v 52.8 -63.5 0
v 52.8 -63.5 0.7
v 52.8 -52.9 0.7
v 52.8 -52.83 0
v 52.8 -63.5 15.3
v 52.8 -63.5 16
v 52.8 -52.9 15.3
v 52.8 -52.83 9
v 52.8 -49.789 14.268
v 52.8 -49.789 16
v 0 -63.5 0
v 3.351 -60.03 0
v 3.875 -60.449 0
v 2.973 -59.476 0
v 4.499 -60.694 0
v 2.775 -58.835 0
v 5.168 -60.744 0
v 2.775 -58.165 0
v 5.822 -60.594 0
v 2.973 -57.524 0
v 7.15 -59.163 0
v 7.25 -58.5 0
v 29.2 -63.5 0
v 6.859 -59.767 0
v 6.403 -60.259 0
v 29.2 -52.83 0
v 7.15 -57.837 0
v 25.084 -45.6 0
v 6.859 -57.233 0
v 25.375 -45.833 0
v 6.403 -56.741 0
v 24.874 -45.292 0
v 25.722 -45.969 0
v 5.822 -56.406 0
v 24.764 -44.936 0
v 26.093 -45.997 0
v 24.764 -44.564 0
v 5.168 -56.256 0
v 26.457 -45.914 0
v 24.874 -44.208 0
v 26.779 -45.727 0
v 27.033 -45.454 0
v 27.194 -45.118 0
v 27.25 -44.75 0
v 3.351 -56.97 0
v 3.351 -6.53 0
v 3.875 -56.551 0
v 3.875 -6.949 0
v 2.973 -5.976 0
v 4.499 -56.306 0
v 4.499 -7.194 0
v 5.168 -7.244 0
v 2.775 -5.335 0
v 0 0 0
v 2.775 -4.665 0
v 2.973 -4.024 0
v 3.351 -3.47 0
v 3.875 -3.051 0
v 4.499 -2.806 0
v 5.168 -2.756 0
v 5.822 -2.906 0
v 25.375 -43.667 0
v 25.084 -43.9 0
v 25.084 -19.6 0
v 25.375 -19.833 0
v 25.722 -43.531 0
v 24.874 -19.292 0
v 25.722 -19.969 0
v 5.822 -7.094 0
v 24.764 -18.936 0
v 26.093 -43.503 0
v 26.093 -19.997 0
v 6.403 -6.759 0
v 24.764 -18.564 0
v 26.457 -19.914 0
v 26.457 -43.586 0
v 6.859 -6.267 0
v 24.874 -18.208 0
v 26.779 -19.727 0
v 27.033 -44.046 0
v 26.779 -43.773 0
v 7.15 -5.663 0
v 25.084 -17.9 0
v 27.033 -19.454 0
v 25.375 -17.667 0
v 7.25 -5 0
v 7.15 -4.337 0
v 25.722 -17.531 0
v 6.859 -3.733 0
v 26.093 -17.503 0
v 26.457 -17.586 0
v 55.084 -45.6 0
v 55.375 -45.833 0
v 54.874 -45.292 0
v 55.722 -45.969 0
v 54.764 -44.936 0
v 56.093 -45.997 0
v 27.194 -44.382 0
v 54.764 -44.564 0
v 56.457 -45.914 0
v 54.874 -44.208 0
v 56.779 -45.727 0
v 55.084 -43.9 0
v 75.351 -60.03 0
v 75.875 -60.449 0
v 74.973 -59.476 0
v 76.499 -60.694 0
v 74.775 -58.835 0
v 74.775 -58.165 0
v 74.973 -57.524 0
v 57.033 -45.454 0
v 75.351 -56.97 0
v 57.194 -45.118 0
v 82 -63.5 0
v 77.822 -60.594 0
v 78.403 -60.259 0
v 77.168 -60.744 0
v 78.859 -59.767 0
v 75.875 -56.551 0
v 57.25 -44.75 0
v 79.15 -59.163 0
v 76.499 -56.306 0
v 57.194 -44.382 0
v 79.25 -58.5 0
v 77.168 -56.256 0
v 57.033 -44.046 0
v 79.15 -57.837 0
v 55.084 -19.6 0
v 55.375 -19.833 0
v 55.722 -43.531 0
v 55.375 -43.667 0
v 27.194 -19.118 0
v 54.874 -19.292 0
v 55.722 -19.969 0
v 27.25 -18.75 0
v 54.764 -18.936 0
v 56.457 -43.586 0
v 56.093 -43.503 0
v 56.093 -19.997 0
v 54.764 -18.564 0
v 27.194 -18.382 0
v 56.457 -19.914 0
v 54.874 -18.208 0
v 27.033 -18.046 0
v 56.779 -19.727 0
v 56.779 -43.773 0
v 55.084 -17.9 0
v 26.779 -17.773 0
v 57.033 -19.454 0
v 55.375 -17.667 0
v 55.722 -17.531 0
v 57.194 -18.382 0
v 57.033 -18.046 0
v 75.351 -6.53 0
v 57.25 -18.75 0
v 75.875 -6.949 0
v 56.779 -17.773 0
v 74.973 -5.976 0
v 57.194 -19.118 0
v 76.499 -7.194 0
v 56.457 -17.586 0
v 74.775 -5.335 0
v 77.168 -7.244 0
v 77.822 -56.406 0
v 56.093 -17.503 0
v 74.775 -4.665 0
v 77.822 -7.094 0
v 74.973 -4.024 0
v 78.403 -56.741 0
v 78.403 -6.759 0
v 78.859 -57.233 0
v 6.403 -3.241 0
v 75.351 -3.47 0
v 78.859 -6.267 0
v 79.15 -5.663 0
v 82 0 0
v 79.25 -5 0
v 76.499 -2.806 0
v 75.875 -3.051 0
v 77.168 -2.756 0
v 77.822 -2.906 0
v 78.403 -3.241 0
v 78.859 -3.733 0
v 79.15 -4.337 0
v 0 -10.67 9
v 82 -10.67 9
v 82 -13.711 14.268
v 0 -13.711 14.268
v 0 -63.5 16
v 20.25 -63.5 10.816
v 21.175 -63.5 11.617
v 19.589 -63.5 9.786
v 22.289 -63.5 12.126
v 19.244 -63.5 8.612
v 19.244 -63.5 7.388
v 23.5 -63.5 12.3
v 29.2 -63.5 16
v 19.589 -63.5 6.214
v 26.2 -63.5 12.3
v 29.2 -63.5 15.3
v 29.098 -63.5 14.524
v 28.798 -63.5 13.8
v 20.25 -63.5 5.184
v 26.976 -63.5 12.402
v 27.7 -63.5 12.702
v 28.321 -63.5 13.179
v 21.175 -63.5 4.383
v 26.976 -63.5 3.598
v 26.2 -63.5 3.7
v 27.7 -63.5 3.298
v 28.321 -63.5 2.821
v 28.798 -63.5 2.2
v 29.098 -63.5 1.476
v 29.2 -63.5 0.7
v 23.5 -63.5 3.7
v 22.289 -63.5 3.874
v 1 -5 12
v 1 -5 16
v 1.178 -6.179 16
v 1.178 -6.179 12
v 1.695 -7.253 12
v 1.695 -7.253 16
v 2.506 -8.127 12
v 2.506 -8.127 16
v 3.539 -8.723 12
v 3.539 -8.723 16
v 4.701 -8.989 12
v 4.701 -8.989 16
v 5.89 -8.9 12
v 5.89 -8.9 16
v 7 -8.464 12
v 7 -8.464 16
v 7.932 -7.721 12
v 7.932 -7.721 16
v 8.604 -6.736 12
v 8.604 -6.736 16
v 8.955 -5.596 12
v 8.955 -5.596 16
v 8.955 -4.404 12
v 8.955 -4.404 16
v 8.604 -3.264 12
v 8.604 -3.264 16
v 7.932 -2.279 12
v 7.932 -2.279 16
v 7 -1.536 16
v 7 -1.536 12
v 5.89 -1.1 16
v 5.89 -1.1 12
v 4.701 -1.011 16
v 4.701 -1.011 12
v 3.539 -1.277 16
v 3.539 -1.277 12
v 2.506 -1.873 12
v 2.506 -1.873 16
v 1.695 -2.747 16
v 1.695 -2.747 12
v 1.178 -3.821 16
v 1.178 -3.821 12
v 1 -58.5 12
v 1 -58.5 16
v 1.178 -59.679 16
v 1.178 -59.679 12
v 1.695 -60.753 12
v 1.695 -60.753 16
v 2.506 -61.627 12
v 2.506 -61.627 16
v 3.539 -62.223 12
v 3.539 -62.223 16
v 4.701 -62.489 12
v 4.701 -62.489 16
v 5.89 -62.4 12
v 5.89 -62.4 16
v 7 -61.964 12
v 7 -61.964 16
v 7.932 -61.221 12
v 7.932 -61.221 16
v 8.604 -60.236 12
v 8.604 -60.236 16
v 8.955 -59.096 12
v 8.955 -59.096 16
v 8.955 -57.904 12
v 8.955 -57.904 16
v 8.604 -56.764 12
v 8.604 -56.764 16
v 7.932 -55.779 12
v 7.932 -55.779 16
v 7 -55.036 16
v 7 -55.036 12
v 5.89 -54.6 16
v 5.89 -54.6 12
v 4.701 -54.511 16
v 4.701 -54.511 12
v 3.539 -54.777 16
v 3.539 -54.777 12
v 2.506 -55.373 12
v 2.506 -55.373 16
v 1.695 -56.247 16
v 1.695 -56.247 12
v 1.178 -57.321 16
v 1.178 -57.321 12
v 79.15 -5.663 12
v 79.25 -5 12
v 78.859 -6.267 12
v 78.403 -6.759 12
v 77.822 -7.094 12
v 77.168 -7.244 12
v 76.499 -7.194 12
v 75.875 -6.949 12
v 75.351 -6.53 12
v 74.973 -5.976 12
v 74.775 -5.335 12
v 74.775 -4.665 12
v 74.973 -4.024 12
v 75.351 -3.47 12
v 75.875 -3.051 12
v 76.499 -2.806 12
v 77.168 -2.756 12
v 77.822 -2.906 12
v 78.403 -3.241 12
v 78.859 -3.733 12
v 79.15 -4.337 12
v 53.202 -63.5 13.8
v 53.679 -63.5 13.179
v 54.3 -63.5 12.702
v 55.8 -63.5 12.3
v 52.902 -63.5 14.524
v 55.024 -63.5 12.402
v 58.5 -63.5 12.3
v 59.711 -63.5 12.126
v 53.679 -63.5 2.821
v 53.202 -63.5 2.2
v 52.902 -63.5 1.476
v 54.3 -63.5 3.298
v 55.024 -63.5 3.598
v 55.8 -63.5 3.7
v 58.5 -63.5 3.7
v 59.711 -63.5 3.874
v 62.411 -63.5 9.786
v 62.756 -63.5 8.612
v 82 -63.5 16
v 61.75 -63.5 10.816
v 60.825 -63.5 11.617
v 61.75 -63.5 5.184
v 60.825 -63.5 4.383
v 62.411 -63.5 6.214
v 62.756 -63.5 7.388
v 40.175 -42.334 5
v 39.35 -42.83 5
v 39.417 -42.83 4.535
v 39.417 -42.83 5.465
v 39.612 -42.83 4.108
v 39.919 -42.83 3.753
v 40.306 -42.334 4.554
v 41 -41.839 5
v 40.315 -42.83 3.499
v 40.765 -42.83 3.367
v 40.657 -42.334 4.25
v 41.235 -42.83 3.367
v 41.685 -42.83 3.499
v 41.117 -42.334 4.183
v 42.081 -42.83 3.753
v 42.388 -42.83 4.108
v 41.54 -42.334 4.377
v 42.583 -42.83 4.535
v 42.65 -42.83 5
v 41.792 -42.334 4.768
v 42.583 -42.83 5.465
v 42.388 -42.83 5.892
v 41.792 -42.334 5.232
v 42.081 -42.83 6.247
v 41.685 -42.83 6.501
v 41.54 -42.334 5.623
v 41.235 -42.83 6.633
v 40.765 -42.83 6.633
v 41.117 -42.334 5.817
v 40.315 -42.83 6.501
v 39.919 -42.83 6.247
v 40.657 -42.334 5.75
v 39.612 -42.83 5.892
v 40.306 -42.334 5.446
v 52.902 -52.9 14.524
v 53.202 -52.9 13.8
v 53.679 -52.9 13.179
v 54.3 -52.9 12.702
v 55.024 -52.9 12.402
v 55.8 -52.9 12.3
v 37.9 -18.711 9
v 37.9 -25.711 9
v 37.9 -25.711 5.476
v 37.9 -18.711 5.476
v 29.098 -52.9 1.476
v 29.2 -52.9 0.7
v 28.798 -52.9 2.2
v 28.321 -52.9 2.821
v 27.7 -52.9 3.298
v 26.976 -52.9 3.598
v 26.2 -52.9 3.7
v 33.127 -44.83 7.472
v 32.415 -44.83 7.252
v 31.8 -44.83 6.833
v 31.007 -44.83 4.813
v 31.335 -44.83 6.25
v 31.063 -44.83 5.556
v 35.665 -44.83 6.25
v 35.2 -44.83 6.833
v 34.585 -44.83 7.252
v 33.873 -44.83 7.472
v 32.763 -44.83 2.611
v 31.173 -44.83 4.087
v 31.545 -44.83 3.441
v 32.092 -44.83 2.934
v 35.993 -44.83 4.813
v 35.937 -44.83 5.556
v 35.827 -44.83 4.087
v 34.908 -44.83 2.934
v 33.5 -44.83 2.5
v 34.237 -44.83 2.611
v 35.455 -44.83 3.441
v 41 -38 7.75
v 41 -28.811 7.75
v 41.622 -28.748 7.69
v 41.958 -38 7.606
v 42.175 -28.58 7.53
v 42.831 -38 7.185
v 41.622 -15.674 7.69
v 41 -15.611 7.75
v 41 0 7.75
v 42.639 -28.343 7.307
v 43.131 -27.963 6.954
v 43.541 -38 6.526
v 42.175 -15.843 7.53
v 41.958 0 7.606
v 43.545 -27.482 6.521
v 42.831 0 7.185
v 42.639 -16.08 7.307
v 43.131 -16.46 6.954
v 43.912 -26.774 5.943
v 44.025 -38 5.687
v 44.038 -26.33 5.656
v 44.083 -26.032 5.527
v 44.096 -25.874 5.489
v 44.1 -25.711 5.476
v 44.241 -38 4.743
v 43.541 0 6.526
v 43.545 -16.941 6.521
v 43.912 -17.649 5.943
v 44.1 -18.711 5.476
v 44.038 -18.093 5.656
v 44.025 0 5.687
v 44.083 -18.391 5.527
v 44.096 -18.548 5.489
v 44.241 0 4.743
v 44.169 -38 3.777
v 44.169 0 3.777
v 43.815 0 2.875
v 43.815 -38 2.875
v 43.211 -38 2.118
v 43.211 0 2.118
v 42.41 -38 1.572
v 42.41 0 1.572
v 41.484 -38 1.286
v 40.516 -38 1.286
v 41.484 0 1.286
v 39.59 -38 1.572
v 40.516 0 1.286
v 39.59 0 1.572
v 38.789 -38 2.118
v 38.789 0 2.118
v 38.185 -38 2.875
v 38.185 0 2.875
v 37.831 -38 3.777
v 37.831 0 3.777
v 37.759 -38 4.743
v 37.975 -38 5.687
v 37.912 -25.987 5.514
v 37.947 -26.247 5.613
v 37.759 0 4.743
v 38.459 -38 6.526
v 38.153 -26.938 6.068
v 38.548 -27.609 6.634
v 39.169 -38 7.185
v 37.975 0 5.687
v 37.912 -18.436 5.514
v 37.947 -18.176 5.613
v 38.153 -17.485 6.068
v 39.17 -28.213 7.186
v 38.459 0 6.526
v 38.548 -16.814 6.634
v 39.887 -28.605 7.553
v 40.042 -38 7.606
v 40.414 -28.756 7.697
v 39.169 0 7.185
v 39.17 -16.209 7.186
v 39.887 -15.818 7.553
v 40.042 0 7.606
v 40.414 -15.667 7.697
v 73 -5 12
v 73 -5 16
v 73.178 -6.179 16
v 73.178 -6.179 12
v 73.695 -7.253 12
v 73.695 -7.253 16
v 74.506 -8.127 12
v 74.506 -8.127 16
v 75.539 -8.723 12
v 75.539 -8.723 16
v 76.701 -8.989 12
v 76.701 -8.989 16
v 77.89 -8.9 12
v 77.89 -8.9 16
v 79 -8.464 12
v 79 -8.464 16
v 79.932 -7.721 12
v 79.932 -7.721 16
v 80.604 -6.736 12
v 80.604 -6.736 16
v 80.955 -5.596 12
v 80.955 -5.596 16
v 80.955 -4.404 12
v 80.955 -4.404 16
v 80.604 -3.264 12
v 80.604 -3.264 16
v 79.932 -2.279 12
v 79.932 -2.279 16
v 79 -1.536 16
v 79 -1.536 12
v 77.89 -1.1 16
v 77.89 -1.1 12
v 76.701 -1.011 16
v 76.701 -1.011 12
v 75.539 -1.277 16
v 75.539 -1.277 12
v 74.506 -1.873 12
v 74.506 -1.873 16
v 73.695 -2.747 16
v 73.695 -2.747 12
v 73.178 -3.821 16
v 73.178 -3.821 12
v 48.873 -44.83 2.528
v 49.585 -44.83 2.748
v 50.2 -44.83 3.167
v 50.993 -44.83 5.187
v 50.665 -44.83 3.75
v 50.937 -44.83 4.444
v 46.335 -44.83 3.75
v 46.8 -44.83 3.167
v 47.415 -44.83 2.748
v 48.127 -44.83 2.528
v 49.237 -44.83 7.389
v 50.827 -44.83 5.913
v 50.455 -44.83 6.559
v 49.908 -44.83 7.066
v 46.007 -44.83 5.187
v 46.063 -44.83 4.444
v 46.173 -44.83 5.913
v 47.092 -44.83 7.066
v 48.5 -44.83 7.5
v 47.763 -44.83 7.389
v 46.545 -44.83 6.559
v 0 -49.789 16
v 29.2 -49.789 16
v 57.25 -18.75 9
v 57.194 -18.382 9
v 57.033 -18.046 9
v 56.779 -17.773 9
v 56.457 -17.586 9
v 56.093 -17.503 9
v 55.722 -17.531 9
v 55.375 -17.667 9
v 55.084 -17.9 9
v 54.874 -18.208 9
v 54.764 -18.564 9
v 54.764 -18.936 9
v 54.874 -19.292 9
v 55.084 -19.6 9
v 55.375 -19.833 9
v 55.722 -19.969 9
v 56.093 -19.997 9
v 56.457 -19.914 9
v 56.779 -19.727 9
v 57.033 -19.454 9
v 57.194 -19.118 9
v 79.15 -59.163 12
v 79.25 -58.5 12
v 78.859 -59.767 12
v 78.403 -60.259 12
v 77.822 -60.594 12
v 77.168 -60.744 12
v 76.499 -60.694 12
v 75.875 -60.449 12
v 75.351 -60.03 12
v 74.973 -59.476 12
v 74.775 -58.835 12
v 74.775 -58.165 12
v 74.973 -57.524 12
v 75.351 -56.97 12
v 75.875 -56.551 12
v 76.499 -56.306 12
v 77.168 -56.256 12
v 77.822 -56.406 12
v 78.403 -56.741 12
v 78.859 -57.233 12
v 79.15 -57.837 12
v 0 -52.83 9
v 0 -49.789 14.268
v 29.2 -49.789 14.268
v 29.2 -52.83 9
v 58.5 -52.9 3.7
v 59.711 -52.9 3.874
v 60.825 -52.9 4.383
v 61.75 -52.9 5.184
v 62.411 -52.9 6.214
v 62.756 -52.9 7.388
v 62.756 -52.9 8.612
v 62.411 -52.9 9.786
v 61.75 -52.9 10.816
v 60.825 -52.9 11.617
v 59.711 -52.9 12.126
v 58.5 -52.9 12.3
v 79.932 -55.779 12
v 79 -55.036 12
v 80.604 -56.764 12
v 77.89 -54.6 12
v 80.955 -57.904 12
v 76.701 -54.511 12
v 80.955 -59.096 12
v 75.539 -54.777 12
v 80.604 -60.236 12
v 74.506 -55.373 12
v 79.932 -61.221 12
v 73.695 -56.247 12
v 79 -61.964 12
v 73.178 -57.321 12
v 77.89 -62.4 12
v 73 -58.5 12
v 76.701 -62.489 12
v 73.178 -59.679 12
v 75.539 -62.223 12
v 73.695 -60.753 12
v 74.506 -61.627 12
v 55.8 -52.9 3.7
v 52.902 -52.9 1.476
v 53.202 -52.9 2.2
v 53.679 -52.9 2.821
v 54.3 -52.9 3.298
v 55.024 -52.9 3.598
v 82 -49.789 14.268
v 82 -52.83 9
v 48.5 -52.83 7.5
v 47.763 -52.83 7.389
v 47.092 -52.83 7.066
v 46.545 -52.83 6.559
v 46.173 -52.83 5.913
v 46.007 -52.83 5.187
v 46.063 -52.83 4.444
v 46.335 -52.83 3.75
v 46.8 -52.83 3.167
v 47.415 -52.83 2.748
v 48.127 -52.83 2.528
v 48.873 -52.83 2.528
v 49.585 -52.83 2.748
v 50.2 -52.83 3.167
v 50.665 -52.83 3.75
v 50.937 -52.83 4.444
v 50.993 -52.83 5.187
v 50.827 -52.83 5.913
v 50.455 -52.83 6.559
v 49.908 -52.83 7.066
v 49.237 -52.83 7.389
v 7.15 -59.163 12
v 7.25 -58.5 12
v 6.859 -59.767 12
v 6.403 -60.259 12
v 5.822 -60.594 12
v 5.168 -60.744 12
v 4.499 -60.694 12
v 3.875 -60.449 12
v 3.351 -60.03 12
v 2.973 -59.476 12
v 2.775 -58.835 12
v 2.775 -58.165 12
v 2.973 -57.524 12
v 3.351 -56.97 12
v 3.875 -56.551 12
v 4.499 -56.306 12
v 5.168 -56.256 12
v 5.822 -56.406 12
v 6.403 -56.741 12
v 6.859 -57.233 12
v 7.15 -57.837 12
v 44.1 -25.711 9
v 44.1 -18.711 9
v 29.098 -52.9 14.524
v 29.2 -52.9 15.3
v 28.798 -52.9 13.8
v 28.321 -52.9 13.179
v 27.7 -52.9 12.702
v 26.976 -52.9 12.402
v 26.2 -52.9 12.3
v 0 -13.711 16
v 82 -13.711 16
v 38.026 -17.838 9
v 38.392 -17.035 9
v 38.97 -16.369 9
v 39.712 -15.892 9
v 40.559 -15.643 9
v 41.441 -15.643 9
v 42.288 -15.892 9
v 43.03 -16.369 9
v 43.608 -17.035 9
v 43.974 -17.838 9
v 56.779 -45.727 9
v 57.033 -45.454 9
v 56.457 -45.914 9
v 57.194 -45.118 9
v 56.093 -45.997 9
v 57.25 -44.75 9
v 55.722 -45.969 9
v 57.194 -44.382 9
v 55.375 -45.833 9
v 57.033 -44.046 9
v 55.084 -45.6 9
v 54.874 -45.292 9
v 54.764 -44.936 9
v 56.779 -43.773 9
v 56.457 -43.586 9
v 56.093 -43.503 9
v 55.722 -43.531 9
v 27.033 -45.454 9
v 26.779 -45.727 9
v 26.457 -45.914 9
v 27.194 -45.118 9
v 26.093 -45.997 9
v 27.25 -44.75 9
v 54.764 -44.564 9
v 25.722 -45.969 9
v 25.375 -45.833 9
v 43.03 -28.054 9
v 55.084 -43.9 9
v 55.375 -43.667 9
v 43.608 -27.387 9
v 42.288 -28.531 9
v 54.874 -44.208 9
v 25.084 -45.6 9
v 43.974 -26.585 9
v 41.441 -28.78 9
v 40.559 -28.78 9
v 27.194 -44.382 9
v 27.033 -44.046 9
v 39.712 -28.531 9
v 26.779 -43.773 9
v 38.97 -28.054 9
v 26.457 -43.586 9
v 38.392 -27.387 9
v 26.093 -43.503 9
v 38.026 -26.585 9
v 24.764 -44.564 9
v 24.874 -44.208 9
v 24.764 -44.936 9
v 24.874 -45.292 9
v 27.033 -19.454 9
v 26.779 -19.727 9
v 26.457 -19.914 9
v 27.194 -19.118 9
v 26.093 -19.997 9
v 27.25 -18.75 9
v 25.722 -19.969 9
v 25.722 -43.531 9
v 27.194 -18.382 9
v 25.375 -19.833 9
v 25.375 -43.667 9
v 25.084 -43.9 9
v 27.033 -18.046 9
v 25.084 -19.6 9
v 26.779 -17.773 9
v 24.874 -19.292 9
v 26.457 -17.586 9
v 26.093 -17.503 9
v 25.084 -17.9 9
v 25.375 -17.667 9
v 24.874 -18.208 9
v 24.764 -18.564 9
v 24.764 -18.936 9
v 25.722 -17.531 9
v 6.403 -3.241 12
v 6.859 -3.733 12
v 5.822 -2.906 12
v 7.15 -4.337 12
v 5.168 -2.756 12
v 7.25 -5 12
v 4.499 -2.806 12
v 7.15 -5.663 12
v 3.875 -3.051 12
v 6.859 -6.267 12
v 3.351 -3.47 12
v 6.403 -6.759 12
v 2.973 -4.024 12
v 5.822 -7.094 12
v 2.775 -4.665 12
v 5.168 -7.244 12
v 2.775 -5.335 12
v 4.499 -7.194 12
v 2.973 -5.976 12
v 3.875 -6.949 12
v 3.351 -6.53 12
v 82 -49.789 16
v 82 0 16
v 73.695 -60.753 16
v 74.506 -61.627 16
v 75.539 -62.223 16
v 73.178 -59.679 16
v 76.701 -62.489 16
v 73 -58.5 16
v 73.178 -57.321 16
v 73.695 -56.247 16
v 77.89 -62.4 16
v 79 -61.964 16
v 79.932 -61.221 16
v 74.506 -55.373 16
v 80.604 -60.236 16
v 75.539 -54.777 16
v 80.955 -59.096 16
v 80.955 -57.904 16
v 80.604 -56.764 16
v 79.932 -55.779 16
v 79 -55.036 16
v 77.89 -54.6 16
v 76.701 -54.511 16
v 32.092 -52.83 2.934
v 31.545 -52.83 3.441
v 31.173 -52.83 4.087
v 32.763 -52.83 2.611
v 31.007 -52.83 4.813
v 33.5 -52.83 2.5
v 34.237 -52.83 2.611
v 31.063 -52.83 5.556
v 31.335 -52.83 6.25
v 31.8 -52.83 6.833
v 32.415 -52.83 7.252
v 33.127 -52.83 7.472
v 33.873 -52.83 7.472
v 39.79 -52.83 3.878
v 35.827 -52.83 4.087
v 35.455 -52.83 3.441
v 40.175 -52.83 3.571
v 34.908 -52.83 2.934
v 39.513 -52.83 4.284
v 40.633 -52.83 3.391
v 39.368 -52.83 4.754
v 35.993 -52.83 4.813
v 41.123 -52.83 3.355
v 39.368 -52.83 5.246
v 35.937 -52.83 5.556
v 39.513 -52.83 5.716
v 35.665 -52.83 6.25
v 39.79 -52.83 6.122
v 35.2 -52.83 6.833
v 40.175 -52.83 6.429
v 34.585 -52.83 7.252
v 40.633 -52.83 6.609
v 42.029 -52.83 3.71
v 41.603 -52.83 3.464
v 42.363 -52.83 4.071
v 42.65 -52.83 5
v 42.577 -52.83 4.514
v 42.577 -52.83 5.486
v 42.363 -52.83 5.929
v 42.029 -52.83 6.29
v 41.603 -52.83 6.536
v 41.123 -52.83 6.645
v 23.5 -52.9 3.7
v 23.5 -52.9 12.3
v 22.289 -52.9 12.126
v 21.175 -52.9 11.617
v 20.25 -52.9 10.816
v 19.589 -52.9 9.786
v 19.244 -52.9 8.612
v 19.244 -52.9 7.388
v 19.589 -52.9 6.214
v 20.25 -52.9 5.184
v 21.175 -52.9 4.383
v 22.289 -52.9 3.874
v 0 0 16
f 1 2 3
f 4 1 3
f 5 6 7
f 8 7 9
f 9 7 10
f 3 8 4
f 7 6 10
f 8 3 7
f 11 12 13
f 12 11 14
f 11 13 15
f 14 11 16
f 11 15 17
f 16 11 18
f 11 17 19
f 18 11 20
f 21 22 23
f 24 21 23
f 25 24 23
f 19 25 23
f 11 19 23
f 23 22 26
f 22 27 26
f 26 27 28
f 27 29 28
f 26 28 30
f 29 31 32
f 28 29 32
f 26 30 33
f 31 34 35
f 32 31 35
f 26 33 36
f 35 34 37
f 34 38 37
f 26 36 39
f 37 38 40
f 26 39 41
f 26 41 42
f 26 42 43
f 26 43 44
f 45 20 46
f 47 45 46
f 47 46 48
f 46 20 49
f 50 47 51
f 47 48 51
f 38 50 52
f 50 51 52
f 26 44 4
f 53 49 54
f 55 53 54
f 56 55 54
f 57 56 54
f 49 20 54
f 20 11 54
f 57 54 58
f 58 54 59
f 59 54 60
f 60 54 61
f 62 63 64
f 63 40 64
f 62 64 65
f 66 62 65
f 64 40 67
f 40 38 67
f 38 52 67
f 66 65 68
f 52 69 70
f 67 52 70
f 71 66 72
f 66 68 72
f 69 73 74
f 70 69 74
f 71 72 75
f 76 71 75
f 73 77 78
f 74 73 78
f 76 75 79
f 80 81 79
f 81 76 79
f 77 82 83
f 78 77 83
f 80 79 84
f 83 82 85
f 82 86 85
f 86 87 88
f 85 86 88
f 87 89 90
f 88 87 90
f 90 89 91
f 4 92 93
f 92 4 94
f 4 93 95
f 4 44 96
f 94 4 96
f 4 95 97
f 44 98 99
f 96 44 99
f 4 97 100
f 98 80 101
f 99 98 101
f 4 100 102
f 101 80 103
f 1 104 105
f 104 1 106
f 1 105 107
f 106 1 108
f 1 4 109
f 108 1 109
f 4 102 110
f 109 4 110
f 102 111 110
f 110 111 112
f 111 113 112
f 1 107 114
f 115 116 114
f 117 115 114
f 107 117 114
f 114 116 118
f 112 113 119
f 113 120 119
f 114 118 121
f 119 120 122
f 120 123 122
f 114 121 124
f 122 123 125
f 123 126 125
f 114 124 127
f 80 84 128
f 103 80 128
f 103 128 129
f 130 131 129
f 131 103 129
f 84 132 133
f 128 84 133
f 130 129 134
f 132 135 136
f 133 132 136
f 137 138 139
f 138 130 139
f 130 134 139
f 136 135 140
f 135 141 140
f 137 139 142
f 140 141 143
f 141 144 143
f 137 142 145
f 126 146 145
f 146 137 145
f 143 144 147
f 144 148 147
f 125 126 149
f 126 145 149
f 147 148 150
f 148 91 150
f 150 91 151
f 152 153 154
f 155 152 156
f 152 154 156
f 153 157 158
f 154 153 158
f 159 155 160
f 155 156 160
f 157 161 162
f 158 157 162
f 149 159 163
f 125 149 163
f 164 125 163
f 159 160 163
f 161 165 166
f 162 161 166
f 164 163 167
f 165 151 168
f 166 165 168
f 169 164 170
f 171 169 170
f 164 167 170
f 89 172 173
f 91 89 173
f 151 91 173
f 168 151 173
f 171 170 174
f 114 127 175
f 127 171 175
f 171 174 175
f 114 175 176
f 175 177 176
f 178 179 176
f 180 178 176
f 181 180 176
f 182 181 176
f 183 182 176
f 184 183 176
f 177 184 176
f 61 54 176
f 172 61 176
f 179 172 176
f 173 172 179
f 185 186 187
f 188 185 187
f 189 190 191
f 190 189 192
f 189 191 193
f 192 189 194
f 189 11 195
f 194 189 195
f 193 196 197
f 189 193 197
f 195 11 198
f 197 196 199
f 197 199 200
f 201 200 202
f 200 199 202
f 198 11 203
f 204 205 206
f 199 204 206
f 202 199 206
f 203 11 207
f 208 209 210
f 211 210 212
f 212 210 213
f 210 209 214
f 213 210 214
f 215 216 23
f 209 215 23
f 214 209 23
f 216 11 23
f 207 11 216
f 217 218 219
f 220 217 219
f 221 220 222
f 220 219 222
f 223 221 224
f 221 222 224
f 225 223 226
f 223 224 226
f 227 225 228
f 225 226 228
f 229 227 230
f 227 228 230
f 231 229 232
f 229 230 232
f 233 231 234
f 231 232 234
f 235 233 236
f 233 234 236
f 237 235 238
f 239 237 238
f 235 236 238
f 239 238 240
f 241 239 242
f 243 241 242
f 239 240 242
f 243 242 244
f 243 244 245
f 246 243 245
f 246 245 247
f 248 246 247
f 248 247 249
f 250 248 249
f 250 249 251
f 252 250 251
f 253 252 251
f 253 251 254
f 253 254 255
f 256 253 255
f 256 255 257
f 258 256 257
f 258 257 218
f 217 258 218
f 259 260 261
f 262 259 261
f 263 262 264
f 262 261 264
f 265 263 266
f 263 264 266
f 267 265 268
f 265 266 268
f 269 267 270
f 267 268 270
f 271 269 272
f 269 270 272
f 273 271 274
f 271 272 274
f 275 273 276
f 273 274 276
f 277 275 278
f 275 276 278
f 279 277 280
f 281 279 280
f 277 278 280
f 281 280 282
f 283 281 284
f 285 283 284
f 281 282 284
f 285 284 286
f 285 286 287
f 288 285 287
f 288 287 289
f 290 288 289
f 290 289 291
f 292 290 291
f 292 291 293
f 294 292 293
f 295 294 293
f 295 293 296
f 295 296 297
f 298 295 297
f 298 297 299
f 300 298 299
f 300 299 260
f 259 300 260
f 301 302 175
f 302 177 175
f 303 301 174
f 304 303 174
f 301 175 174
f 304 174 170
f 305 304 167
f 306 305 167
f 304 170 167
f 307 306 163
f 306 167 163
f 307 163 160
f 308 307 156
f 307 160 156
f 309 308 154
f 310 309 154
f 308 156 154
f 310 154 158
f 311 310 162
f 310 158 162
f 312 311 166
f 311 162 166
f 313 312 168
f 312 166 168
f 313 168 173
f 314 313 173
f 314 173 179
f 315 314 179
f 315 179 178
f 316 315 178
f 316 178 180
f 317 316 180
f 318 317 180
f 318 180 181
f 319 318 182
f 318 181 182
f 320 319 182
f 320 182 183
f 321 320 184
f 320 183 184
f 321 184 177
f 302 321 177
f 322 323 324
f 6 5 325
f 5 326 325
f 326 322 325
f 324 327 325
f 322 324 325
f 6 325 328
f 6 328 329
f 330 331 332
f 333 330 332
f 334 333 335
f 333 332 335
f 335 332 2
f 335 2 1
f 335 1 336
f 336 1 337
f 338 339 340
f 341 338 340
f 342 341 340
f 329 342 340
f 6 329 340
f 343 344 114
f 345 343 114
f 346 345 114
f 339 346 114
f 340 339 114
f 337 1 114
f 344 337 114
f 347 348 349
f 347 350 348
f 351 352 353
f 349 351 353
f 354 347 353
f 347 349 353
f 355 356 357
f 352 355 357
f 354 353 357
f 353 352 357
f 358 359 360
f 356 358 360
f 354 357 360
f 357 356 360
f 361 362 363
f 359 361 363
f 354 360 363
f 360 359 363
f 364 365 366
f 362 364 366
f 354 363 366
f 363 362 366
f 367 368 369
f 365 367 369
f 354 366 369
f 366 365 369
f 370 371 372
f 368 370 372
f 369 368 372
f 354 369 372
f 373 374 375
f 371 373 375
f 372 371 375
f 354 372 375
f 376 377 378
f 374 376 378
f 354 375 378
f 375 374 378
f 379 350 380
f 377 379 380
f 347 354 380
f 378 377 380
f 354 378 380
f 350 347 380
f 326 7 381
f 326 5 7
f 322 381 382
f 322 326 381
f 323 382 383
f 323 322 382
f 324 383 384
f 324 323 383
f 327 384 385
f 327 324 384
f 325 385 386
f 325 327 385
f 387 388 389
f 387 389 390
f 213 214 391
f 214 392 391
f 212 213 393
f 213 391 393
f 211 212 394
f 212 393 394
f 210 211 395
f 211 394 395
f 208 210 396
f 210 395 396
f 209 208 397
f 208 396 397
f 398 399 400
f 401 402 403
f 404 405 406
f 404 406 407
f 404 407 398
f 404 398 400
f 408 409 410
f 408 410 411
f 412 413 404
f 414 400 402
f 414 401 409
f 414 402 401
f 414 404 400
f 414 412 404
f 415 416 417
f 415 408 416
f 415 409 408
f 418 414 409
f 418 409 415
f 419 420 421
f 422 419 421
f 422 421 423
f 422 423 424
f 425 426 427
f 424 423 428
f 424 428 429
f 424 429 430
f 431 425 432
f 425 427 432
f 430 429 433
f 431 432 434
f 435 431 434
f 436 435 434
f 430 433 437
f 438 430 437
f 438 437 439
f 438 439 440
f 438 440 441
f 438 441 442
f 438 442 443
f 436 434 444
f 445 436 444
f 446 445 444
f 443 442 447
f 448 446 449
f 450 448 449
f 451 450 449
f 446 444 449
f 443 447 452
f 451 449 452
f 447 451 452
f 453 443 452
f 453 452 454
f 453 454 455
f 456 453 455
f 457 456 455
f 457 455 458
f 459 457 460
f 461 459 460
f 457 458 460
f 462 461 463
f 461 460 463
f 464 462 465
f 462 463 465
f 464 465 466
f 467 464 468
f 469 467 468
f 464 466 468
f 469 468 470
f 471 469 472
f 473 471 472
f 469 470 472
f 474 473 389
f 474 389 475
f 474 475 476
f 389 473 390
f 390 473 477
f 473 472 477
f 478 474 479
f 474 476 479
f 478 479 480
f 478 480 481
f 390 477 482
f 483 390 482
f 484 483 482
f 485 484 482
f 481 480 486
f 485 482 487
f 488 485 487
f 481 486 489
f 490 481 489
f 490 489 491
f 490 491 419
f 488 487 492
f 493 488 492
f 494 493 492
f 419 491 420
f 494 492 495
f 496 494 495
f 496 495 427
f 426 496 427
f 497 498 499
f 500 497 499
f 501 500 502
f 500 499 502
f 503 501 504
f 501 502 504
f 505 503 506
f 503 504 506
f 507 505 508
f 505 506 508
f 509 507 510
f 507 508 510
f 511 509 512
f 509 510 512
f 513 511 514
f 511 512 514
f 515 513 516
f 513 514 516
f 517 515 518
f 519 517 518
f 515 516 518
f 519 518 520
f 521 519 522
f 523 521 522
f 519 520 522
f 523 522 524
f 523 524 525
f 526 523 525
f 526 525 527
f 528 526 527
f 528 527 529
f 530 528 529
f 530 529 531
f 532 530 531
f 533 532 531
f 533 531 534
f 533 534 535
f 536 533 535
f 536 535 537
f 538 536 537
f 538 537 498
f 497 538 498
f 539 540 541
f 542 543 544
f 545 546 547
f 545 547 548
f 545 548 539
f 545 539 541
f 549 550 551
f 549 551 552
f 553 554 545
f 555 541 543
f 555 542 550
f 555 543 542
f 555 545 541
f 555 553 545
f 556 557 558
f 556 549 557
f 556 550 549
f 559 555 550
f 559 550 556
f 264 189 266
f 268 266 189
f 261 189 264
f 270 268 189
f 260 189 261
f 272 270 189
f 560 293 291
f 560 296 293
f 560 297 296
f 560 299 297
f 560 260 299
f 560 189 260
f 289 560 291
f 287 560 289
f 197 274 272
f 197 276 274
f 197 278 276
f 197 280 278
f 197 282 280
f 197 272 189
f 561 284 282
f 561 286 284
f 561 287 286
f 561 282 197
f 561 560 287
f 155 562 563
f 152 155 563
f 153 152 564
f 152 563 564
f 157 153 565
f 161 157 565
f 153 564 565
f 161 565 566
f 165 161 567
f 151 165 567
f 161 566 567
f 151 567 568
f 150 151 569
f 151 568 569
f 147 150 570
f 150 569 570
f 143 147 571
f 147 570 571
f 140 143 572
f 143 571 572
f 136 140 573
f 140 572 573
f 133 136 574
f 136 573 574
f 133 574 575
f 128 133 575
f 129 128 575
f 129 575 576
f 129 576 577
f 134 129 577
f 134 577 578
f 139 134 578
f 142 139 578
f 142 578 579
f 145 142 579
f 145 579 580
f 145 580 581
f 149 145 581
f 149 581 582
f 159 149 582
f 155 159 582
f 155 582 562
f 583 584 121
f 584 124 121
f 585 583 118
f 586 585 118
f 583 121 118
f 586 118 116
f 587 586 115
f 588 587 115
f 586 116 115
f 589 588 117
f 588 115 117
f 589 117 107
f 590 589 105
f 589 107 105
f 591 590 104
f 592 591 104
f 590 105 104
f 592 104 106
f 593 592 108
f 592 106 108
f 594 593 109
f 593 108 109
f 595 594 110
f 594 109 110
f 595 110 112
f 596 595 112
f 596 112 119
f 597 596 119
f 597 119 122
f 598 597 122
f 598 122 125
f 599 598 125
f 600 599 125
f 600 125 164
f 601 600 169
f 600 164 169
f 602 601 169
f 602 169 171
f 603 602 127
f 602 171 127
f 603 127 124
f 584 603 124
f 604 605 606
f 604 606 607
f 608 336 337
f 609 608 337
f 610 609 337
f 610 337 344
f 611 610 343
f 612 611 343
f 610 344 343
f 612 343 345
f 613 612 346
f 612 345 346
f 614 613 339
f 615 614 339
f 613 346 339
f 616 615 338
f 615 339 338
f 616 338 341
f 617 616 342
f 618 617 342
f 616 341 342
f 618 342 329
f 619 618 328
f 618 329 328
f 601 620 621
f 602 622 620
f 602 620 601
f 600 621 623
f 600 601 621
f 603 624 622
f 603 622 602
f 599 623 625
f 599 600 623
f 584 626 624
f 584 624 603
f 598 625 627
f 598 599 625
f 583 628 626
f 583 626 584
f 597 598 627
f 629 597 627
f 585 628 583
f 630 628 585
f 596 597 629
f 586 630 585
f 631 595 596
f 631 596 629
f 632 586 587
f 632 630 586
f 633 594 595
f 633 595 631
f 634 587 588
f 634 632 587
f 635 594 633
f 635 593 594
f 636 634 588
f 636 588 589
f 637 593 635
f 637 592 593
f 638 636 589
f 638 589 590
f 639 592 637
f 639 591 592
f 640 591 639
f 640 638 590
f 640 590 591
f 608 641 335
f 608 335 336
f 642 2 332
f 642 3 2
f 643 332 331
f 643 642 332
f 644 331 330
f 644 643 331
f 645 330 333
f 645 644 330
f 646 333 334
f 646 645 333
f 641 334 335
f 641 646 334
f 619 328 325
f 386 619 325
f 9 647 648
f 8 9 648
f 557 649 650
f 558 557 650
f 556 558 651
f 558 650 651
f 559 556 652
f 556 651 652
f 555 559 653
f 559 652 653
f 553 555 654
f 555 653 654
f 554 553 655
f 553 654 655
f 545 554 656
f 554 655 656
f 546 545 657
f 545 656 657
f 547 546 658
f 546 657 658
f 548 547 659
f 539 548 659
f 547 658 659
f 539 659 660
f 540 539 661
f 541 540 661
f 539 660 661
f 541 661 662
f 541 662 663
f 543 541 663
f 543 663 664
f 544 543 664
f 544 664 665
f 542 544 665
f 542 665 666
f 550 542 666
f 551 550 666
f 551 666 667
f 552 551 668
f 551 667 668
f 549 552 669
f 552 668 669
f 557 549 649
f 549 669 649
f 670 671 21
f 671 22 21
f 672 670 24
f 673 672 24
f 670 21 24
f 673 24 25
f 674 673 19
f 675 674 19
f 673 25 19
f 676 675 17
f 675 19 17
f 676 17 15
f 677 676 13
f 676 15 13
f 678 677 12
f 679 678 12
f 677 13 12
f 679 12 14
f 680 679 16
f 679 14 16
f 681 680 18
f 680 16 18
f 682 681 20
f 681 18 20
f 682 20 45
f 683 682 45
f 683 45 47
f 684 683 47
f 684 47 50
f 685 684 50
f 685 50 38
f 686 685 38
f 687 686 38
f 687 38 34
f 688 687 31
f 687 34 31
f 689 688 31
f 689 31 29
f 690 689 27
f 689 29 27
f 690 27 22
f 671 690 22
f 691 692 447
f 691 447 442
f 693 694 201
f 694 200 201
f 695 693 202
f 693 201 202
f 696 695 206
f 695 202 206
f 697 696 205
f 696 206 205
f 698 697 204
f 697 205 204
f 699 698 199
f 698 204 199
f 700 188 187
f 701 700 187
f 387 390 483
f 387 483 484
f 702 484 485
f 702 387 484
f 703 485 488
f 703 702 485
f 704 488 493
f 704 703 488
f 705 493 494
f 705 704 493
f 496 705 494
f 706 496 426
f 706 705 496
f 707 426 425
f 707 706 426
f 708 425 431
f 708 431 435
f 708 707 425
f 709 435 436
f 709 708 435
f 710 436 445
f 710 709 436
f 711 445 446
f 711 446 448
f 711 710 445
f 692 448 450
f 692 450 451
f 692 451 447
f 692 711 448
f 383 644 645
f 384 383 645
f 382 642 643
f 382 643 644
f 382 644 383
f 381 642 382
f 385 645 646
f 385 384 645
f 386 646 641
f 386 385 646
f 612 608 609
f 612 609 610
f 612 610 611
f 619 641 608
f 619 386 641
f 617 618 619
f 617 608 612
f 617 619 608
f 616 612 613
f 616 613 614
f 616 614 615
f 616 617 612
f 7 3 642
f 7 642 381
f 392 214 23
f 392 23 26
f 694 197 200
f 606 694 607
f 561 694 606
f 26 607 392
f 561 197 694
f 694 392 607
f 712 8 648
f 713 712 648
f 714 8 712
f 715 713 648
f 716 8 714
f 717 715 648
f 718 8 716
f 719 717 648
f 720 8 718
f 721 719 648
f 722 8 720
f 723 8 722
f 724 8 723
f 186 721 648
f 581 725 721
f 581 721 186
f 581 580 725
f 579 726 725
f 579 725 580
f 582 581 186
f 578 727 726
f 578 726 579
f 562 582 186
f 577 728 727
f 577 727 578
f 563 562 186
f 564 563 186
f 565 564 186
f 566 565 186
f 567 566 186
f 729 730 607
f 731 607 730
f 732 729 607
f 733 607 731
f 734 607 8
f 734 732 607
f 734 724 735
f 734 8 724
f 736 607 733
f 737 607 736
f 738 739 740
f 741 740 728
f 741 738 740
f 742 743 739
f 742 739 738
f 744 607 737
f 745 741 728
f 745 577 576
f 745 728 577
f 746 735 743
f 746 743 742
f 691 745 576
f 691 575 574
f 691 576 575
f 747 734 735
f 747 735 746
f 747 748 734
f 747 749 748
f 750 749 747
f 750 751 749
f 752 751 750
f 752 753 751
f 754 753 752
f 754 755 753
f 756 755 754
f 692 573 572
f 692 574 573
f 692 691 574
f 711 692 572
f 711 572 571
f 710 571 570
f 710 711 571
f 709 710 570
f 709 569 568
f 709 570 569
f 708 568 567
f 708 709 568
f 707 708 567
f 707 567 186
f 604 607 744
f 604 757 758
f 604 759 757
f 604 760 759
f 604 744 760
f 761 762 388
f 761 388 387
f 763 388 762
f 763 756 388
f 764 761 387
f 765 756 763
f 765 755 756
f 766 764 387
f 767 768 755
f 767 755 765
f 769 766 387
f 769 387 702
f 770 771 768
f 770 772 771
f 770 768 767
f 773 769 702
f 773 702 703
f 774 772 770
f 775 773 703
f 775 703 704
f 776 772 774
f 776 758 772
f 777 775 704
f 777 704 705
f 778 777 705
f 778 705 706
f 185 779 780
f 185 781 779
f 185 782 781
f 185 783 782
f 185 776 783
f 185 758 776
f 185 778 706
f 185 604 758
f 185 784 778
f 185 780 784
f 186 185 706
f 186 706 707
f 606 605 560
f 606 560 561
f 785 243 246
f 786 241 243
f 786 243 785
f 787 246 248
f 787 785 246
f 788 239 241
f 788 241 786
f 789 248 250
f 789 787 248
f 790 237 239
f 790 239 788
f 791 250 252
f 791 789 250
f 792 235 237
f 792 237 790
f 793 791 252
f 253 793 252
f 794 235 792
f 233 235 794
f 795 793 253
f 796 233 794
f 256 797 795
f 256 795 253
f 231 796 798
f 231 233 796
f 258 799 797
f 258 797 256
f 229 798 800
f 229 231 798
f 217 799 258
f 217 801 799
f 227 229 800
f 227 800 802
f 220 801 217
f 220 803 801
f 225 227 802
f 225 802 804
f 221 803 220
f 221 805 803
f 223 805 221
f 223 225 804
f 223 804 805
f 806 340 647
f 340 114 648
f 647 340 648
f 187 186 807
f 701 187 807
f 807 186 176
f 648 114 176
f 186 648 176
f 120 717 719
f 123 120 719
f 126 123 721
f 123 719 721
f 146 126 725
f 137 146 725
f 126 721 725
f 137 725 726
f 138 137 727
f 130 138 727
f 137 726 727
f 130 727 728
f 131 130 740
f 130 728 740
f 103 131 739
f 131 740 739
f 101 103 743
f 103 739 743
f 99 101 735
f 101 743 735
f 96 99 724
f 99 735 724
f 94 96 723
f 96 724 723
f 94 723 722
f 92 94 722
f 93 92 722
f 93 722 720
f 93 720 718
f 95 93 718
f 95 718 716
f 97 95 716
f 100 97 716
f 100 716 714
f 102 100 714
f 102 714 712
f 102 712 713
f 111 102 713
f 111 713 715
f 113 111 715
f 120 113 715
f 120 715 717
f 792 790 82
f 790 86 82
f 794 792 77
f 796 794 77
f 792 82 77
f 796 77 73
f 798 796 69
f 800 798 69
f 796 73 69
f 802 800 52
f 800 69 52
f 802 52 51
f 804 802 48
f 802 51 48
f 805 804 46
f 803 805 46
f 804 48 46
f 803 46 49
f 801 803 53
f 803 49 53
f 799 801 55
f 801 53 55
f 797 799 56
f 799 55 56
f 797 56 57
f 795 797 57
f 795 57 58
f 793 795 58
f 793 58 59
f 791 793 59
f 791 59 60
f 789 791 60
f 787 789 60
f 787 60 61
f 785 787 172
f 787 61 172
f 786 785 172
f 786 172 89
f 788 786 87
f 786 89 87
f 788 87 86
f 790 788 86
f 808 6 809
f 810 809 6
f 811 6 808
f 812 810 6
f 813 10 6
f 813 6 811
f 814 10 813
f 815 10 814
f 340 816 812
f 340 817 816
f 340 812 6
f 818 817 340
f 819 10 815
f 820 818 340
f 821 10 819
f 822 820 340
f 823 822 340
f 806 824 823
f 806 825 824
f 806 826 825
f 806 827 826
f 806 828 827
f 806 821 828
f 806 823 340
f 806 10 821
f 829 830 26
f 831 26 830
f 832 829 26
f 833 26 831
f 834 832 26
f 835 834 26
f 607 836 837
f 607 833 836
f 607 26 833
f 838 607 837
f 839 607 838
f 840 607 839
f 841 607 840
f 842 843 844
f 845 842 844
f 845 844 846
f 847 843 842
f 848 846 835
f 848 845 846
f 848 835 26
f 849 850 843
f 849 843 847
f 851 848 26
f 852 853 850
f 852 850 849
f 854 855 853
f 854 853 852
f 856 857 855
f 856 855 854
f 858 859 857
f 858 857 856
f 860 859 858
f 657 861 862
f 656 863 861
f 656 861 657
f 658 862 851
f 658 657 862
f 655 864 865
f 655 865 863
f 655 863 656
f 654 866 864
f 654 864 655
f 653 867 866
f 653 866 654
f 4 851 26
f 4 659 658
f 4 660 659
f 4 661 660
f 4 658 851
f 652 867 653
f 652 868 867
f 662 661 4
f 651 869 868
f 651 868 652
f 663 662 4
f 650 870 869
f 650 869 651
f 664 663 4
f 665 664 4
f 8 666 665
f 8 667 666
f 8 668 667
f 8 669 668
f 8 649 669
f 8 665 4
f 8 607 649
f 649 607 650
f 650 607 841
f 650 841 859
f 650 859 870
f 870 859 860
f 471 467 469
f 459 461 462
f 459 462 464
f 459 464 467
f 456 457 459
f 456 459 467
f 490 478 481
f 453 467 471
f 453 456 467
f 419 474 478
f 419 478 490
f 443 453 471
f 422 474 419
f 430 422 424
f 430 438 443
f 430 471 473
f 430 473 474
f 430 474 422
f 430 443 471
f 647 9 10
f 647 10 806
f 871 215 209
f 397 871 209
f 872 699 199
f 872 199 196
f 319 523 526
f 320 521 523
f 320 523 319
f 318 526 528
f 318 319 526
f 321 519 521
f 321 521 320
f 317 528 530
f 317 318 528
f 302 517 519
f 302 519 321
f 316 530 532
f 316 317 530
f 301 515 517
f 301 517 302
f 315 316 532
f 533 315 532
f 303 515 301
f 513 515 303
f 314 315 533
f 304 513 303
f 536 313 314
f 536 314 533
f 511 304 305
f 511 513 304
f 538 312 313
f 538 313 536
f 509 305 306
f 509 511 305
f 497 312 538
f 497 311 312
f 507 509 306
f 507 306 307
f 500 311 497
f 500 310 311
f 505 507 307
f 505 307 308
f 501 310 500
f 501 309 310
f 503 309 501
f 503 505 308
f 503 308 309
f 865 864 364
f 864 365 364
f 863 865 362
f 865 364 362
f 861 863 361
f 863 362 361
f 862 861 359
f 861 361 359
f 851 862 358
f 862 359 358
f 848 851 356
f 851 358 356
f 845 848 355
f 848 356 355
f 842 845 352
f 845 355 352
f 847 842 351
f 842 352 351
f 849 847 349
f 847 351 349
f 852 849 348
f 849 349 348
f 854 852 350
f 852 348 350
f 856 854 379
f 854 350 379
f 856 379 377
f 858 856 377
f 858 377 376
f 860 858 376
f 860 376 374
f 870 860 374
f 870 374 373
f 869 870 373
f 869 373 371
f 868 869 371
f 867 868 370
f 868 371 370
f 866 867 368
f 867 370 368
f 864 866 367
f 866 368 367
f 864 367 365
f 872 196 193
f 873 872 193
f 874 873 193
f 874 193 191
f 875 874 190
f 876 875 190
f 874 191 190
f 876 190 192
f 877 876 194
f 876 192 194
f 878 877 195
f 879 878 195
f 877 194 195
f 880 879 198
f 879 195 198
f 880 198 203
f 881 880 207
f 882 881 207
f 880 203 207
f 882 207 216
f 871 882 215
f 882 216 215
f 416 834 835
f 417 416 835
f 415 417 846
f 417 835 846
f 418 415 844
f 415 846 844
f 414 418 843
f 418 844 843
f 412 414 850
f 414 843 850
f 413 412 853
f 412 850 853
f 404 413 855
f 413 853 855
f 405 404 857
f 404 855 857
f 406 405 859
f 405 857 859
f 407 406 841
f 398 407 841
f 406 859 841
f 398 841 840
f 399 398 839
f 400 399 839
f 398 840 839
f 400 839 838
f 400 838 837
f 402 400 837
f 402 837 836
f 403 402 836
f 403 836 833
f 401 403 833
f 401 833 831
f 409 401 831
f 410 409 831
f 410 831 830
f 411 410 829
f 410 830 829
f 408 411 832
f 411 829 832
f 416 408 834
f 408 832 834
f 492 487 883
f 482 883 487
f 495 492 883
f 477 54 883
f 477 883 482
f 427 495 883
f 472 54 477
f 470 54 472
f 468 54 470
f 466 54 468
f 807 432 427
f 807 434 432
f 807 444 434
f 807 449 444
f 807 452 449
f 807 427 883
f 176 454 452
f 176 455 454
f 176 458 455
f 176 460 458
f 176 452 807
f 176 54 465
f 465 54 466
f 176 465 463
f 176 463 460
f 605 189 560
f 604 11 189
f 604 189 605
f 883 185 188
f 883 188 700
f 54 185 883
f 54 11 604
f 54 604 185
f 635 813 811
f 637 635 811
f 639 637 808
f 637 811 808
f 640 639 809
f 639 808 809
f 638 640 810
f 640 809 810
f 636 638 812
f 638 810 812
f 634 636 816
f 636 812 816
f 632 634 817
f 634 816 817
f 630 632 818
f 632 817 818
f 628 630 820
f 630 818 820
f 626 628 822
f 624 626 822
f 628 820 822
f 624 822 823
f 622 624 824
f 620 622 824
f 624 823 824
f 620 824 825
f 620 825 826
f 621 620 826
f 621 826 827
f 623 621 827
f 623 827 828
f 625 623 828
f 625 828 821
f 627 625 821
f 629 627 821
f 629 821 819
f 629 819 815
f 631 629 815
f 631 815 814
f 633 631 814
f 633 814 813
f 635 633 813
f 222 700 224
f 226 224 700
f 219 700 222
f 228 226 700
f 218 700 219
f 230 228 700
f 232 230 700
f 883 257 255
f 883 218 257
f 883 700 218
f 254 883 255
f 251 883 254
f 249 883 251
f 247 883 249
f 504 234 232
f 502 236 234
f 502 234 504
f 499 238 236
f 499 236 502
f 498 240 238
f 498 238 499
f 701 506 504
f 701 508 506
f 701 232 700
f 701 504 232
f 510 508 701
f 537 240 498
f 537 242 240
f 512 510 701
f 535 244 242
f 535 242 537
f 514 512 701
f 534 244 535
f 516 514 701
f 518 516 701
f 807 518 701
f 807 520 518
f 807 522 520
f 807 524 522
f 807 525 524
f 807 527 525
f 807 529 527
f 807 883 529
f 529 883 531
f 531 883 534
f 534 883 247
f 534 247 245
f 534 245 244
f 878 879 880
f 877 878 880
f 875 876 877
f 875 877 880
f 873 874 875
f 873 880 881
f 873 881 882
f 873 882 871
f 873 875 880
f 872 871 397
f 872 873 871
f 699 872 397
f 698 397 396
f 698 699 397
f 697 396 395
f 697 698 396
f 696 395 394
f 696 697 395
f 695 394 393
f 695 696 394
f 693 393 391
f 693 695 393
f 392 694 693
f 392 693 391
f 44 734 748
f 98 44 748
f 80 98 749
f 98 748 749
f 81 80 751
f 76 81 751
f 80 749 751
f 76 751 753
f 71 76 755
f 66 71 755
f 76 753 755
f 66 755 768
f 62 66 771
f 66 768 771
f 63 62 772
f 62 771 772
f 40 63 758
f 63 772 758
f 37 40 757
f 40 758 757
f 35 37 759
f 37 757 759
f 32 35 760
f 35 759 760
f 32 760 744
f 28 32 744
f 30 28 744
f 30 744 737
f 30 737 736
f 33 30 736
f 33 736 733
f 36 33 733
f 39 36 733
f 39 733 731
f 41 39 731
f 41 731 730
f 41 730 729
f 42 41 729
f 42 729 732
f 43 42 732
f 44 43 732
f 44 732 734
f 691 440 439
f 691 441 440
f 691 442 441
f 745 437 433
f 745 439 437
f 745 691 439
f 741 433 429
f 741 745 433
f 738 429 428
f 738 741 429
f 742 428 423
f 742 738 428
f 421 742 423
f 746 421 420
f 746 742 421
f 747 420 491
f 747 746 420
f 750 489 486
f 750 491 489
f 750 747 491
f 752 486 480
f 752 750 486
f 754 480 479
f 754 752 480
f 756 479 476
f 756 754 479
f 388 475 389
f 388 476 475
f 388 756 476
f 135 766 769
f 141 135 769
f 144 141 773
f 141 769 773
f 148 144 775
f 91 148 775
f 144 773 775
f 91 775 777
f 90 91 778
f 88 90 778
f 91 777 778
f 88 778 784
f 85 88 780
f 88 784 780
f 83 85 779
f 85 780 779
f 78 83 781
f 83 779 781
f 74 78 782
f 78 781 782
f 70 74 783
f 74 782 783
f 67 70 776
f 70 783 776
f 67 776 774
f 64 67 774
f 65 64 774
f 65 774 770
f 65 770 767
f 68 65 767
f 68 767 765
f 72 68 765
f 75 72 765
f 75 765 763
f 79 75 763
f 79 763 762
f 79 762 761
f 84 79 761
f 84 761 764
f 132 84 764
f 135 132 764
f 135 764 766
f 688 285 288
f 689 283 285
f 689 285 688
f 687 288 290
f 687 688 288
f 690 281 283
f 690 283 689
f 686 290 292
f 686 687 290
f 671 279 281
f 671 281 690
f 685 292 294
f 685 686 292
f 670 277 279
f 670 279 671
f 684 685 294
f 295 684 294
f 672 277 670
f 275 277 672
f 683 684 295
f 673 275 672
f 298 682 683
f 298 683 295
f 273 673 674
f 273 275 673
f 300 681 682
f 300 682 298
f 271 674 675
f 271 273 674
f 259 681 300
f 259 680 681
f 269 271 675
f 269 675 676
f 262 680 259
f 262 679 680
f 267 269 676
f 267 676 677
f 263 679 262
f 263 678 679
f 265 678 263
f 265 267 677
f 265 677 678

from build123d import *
from OCP.BRepFilletAPI import BRepFilletAPI_MakeChamfer

# Parameters (mm, degrees)
SKETCH_1_W                  = 82
SKETCH_1_H                  = 63.5
EXTRUDE_1_DEPTH             = 16
CUT_EXTRUDE_1_DEPTH         = 105.939268151
SKETCH_15_W                 = 23.6
SKETCH_15_H                 = 14.711451884
CUT_EXTRUDE_4_DEPTH         = 7
SKETCH_16_W                 = 23.6
SKETCH_16_H                 = 10.67
CUT_EXTRUDE_5_DEPTH         = 9
SKETCH_17_R                 = 2.5
CUT_EXTRUDE_6_DEPTH         = 8
M4X0_72_D                   = 3.3
M4X0_72_DEPTH               = 10
M4X0_72_TIP                 = 0.991420021
CUT_EXTRUDE_7_DEPTH         = 4
SKETCH_26_R                 = 3.25
CUT_EXTRUDE_8_DEPTH         = 38
HOLE_WIZARD_M41_D           = 4.5
HOLE_WIZARD_M41_CBORE_D     = 8
HOLE_WIZARD_M41_CBORE_DEPTH = 4
CHAMFER_2_SIZE              = 1
CHAMFER_2_SIZE2             = 2
CUT_EXTRUDE_12_DEPTH        = 10.6
FILLET_1_R                  = 3
M3X0_51_D                   = 2.5


with BuildPart() as part:
    # Эскиз1 → Бобышка-Вытянуть1 (new body)
    with BuildSketch(Plane.XY):
        with Locations((41, -31.75)):
            Rectangle(SKETCH_1_W, SKETCH_1_H)
    extrude(amount=EXTRUDE_1_DEPTH)

    # Эскиз2 → Вырез-Вытянуть1 (cut, through all)
    with BuildSketch(Plane.ZY):
        Polygon((9, -10.67), (16, -14.711451884), (16, -48.788548116), (9, -52.83), align=None)
    extrude(amount=-CUT_EXTRUDE_1_DEPTH, mode=Mode.SUBTRACT)

    # Эскиз15 → Вырез-Вытянуть4 (cut)
    with BuildSketch(Plane.XY.offset(16)):
        with Locations((41, -56.144274058)):
            Rectangle(SKETCH_15_W, SKETCH_15_H)
    extrude(amount=-CUT_EXTRUDE_4_DEPTH, mode=Mode.SUBTRACT)

    # Эскиз16 → Вырез-Вытянуть5 (cut)
    with BuildSketch(Plane.XY.offset(9)):
        with Locations((41, -58.165)):
            Rectangle(SKETCH_16_W, SKETCH_16_H)
    extrude(amount=-CUT_EXTRUDE_5_DEPTH, mode=Mode.SUBTRACT)

    # Эскиз17 → Вырез-Вытянуть6 (cut)
    with BuildSketch(Plane.XZ.offset(52.83)):
        with Locations(Location((33.5, 5, 0), (0, 0, 270))):
            Circle(SKETCH_17_R)
        with Locations(Location((48.5, 5, 0), (0, 0, 90))):
            Circle(SKETCH_17_R)
    extrude(amount=-CUT_EXTRUDE_6_DEPTH, mode=Mode.SUBTRACT)

    # Отверстие обработанное метчиком M4x0.72
    with Locations(Plane(origin=(0, -52.83, 0), x_dir=(-1, 0, 0), z_dir=(0, -1, 0))):
        with Locations((-41, -5)):
            Hole(M4X0_72_D / 2, depth=M4X0_72_DEPTH)
            with Locations((0, 0, -(M4X0_72_DEPTH + M4X0_72_TIP / 2))):  # 118° drill point
                Cone(0, M4X0_72_D / 2, M4X0_72_TIP, mode=Mode.SUBTRACT)

    # Эскиз25 → Вырез-Вытянуть7 (cut)
    with BuildSketch(Plane.XY.offset(9)):
        with BuildLine():
            Line((44.1, -18.711451884), (44.1, -25.711451884))
            ThreePointArc((44.1, -25.711451884), (41, -28.811451884), (37.9, -25.711451884))
            Line((37.9, -25.711451884), (37.9, -18.711451884))
            ThreePointArc((37.9, -18.711451884), (41, -15.611451884), (44.1, -18.711451884))
        make_face()
    extrude(amount=-CUT_EXTRUDE_7_DEPTH, mode=Mode.SUBTRACT)

    # Эскиз26 → Вырез-Вытянуть8 (cut)
    with BuildSketch(Plane(origin=(0, 0, 0), x_dir=(1, 0, 0), z_dir=(0, 1, 0))):
        with Locations(Location((41, -4.5, 0), (0, 0, 270))):
            Circle(SKETCH_26_R)
    extrude(amount=-CUT_EXTRUDE_8_DEPTH, mode=Mode.SUBTRACT)

    # Цековка для винта с внутренним шестигранником M41 (through all)
    with Locations(Plane(origin=(30.759227947, 26.793365177, 16), x_dir=(-1, 0, 0), z_dir=(0, 0, 1))):
        with Locations((-46.240772053, 31.793365177), (-46.240772053, 85.293365177), (25.759227947, 85.293365177), (25.759227947, 31.793365177)):
            CounterBoreHole(HOLE_WIZARD_M41_D / 2, HOLE_WIZARD_M41_CBORE_D / 2, HOLE_WIZARD_M41_CBORE_DEPTH)

    # Фаска2: one chamfer whose edges measure the first distance from different faces: ONE call of the kernel's chamfer builder (chamfer() names one face for all edges)
    chamfer_2_edges_1 = [part.edges().sort_by_distance(p)[0] for p in [
        (41, -14.711451884, 16),
    ]]
    chamfer_2_side_1 = [part.faces().sort_by_distance(p)[0] for p in [
        (41, -7.569889145, 16),
    ]]
    chamfer_2_edges_2 = [part.edges().sort_by_distance(p)[0] for p in [
        (67.4, -48.788548116, 16),
    ]]
    chamfer_2_side_2 = [part.faces().sort_by_distance(p)[0] for p in [
        (66.127821531, -55.832096576, 16),
    ]]
    chamfer_2_edges_3 = [part.edges().sort_by_distance(p)[0] for p in [
        (14.6, -48.788548116, 16),
    ]]
    chamfer_2_side_3 = [part.faces().sort_by_distance(p)[0] for p in [
        (15.872178469, -55.832096576, 16),
    ]]
    chamfer_2 = BRepFilletAPI_MakeChamfer(part.part.solid().wrapped)
    for e in chamfer_2_edges_1:
        chamfer_2.Add(CHAMFER_2_SIZE, CHAMFER_2_SIZE2, e.wrapped, chamfer_2_side_1[0].wrapped)  # the first distance lies on this face
    for e in chamfer_2_edges_2:
        chamfer_2.Add(CHAMFER_2_SIZE, CHAMFER_2_SIZE2, e.wrapped, chamfer_2_side_2[0].wrapped)  # the first distance lies on this face
    for e in chamfer_2_edges_3:
        chamfer_2.Add(CHAMFER_2_SIZE, CHAMFER_2_SIZE2, e.wrapped, chamfer_2_side_3[0].wrapped)  # the first distance lies on this face
    add(Compound.cast(chamfer_2.Shape()), mode=Mode.REPLACE)

    # Эскиз32 → Вырез-Вытянуть12 (cut)
    with BuildSketch(Plane.XZ.offset(63.5)):
        with BuildLine():
            Line((52.7, -0.2), (52.7, 3.7))
            Line((52.7, 3.7), (58.5, 3.7))
            ThreePointArc((58.5, 3.7), (62.8, 8), (58.5, 12.3))
            Line((58.5, 12.3), (52.7, 12.3))
            Line((52.7, 12.3), (52.7, 16.2))
            Line((52.7, 16.2), (29.3, 16.2))
            Line((29.3, 16.2), (29.3, 12.3))
            Line((29.3, 12.3), (23.5, 12.3))
            ThreePointArc((23.5, 12.3), (19.2, 8), (23.5, 3.7))
            Line((23.5, 3.7), (29.3, 3.7))
            Line((29.3, 3.7), (29.3, -0.2))
            Line((29.3, -0.2), (52.7, -0.2))
        make_face()
    extrude(amount=-CUT_EXTRUDE_12_DEPTH, mode=Mode.SUBTRACT)

    # Скругление1
    fillet_1_edges = [part.edges().sort_by_distance(p)[0] for p in [
        (52.8, -58.2, 3.7),
        (52.8, -58.2, 12.3),
        (29.2, -58.2, 12.3),
        (29.2, -58.2, 3.7),
    ]]
    fillet(fillet_1_edges, radius=FILLET_1_R)

    # Отверстие обработанное метчиком M3x0.51 (through all)
    with Locations(Plane(origin=(0, 0, 0), x_dir=(-1, 0, 0), z_dir=(0, 0, -1))):
        with Locations((-26, -44.75), (-26, -18.75), (-56, -18.75), (-56, -44.75)):
            Hole(M3X0_51_D / 2)


solid = part.part
